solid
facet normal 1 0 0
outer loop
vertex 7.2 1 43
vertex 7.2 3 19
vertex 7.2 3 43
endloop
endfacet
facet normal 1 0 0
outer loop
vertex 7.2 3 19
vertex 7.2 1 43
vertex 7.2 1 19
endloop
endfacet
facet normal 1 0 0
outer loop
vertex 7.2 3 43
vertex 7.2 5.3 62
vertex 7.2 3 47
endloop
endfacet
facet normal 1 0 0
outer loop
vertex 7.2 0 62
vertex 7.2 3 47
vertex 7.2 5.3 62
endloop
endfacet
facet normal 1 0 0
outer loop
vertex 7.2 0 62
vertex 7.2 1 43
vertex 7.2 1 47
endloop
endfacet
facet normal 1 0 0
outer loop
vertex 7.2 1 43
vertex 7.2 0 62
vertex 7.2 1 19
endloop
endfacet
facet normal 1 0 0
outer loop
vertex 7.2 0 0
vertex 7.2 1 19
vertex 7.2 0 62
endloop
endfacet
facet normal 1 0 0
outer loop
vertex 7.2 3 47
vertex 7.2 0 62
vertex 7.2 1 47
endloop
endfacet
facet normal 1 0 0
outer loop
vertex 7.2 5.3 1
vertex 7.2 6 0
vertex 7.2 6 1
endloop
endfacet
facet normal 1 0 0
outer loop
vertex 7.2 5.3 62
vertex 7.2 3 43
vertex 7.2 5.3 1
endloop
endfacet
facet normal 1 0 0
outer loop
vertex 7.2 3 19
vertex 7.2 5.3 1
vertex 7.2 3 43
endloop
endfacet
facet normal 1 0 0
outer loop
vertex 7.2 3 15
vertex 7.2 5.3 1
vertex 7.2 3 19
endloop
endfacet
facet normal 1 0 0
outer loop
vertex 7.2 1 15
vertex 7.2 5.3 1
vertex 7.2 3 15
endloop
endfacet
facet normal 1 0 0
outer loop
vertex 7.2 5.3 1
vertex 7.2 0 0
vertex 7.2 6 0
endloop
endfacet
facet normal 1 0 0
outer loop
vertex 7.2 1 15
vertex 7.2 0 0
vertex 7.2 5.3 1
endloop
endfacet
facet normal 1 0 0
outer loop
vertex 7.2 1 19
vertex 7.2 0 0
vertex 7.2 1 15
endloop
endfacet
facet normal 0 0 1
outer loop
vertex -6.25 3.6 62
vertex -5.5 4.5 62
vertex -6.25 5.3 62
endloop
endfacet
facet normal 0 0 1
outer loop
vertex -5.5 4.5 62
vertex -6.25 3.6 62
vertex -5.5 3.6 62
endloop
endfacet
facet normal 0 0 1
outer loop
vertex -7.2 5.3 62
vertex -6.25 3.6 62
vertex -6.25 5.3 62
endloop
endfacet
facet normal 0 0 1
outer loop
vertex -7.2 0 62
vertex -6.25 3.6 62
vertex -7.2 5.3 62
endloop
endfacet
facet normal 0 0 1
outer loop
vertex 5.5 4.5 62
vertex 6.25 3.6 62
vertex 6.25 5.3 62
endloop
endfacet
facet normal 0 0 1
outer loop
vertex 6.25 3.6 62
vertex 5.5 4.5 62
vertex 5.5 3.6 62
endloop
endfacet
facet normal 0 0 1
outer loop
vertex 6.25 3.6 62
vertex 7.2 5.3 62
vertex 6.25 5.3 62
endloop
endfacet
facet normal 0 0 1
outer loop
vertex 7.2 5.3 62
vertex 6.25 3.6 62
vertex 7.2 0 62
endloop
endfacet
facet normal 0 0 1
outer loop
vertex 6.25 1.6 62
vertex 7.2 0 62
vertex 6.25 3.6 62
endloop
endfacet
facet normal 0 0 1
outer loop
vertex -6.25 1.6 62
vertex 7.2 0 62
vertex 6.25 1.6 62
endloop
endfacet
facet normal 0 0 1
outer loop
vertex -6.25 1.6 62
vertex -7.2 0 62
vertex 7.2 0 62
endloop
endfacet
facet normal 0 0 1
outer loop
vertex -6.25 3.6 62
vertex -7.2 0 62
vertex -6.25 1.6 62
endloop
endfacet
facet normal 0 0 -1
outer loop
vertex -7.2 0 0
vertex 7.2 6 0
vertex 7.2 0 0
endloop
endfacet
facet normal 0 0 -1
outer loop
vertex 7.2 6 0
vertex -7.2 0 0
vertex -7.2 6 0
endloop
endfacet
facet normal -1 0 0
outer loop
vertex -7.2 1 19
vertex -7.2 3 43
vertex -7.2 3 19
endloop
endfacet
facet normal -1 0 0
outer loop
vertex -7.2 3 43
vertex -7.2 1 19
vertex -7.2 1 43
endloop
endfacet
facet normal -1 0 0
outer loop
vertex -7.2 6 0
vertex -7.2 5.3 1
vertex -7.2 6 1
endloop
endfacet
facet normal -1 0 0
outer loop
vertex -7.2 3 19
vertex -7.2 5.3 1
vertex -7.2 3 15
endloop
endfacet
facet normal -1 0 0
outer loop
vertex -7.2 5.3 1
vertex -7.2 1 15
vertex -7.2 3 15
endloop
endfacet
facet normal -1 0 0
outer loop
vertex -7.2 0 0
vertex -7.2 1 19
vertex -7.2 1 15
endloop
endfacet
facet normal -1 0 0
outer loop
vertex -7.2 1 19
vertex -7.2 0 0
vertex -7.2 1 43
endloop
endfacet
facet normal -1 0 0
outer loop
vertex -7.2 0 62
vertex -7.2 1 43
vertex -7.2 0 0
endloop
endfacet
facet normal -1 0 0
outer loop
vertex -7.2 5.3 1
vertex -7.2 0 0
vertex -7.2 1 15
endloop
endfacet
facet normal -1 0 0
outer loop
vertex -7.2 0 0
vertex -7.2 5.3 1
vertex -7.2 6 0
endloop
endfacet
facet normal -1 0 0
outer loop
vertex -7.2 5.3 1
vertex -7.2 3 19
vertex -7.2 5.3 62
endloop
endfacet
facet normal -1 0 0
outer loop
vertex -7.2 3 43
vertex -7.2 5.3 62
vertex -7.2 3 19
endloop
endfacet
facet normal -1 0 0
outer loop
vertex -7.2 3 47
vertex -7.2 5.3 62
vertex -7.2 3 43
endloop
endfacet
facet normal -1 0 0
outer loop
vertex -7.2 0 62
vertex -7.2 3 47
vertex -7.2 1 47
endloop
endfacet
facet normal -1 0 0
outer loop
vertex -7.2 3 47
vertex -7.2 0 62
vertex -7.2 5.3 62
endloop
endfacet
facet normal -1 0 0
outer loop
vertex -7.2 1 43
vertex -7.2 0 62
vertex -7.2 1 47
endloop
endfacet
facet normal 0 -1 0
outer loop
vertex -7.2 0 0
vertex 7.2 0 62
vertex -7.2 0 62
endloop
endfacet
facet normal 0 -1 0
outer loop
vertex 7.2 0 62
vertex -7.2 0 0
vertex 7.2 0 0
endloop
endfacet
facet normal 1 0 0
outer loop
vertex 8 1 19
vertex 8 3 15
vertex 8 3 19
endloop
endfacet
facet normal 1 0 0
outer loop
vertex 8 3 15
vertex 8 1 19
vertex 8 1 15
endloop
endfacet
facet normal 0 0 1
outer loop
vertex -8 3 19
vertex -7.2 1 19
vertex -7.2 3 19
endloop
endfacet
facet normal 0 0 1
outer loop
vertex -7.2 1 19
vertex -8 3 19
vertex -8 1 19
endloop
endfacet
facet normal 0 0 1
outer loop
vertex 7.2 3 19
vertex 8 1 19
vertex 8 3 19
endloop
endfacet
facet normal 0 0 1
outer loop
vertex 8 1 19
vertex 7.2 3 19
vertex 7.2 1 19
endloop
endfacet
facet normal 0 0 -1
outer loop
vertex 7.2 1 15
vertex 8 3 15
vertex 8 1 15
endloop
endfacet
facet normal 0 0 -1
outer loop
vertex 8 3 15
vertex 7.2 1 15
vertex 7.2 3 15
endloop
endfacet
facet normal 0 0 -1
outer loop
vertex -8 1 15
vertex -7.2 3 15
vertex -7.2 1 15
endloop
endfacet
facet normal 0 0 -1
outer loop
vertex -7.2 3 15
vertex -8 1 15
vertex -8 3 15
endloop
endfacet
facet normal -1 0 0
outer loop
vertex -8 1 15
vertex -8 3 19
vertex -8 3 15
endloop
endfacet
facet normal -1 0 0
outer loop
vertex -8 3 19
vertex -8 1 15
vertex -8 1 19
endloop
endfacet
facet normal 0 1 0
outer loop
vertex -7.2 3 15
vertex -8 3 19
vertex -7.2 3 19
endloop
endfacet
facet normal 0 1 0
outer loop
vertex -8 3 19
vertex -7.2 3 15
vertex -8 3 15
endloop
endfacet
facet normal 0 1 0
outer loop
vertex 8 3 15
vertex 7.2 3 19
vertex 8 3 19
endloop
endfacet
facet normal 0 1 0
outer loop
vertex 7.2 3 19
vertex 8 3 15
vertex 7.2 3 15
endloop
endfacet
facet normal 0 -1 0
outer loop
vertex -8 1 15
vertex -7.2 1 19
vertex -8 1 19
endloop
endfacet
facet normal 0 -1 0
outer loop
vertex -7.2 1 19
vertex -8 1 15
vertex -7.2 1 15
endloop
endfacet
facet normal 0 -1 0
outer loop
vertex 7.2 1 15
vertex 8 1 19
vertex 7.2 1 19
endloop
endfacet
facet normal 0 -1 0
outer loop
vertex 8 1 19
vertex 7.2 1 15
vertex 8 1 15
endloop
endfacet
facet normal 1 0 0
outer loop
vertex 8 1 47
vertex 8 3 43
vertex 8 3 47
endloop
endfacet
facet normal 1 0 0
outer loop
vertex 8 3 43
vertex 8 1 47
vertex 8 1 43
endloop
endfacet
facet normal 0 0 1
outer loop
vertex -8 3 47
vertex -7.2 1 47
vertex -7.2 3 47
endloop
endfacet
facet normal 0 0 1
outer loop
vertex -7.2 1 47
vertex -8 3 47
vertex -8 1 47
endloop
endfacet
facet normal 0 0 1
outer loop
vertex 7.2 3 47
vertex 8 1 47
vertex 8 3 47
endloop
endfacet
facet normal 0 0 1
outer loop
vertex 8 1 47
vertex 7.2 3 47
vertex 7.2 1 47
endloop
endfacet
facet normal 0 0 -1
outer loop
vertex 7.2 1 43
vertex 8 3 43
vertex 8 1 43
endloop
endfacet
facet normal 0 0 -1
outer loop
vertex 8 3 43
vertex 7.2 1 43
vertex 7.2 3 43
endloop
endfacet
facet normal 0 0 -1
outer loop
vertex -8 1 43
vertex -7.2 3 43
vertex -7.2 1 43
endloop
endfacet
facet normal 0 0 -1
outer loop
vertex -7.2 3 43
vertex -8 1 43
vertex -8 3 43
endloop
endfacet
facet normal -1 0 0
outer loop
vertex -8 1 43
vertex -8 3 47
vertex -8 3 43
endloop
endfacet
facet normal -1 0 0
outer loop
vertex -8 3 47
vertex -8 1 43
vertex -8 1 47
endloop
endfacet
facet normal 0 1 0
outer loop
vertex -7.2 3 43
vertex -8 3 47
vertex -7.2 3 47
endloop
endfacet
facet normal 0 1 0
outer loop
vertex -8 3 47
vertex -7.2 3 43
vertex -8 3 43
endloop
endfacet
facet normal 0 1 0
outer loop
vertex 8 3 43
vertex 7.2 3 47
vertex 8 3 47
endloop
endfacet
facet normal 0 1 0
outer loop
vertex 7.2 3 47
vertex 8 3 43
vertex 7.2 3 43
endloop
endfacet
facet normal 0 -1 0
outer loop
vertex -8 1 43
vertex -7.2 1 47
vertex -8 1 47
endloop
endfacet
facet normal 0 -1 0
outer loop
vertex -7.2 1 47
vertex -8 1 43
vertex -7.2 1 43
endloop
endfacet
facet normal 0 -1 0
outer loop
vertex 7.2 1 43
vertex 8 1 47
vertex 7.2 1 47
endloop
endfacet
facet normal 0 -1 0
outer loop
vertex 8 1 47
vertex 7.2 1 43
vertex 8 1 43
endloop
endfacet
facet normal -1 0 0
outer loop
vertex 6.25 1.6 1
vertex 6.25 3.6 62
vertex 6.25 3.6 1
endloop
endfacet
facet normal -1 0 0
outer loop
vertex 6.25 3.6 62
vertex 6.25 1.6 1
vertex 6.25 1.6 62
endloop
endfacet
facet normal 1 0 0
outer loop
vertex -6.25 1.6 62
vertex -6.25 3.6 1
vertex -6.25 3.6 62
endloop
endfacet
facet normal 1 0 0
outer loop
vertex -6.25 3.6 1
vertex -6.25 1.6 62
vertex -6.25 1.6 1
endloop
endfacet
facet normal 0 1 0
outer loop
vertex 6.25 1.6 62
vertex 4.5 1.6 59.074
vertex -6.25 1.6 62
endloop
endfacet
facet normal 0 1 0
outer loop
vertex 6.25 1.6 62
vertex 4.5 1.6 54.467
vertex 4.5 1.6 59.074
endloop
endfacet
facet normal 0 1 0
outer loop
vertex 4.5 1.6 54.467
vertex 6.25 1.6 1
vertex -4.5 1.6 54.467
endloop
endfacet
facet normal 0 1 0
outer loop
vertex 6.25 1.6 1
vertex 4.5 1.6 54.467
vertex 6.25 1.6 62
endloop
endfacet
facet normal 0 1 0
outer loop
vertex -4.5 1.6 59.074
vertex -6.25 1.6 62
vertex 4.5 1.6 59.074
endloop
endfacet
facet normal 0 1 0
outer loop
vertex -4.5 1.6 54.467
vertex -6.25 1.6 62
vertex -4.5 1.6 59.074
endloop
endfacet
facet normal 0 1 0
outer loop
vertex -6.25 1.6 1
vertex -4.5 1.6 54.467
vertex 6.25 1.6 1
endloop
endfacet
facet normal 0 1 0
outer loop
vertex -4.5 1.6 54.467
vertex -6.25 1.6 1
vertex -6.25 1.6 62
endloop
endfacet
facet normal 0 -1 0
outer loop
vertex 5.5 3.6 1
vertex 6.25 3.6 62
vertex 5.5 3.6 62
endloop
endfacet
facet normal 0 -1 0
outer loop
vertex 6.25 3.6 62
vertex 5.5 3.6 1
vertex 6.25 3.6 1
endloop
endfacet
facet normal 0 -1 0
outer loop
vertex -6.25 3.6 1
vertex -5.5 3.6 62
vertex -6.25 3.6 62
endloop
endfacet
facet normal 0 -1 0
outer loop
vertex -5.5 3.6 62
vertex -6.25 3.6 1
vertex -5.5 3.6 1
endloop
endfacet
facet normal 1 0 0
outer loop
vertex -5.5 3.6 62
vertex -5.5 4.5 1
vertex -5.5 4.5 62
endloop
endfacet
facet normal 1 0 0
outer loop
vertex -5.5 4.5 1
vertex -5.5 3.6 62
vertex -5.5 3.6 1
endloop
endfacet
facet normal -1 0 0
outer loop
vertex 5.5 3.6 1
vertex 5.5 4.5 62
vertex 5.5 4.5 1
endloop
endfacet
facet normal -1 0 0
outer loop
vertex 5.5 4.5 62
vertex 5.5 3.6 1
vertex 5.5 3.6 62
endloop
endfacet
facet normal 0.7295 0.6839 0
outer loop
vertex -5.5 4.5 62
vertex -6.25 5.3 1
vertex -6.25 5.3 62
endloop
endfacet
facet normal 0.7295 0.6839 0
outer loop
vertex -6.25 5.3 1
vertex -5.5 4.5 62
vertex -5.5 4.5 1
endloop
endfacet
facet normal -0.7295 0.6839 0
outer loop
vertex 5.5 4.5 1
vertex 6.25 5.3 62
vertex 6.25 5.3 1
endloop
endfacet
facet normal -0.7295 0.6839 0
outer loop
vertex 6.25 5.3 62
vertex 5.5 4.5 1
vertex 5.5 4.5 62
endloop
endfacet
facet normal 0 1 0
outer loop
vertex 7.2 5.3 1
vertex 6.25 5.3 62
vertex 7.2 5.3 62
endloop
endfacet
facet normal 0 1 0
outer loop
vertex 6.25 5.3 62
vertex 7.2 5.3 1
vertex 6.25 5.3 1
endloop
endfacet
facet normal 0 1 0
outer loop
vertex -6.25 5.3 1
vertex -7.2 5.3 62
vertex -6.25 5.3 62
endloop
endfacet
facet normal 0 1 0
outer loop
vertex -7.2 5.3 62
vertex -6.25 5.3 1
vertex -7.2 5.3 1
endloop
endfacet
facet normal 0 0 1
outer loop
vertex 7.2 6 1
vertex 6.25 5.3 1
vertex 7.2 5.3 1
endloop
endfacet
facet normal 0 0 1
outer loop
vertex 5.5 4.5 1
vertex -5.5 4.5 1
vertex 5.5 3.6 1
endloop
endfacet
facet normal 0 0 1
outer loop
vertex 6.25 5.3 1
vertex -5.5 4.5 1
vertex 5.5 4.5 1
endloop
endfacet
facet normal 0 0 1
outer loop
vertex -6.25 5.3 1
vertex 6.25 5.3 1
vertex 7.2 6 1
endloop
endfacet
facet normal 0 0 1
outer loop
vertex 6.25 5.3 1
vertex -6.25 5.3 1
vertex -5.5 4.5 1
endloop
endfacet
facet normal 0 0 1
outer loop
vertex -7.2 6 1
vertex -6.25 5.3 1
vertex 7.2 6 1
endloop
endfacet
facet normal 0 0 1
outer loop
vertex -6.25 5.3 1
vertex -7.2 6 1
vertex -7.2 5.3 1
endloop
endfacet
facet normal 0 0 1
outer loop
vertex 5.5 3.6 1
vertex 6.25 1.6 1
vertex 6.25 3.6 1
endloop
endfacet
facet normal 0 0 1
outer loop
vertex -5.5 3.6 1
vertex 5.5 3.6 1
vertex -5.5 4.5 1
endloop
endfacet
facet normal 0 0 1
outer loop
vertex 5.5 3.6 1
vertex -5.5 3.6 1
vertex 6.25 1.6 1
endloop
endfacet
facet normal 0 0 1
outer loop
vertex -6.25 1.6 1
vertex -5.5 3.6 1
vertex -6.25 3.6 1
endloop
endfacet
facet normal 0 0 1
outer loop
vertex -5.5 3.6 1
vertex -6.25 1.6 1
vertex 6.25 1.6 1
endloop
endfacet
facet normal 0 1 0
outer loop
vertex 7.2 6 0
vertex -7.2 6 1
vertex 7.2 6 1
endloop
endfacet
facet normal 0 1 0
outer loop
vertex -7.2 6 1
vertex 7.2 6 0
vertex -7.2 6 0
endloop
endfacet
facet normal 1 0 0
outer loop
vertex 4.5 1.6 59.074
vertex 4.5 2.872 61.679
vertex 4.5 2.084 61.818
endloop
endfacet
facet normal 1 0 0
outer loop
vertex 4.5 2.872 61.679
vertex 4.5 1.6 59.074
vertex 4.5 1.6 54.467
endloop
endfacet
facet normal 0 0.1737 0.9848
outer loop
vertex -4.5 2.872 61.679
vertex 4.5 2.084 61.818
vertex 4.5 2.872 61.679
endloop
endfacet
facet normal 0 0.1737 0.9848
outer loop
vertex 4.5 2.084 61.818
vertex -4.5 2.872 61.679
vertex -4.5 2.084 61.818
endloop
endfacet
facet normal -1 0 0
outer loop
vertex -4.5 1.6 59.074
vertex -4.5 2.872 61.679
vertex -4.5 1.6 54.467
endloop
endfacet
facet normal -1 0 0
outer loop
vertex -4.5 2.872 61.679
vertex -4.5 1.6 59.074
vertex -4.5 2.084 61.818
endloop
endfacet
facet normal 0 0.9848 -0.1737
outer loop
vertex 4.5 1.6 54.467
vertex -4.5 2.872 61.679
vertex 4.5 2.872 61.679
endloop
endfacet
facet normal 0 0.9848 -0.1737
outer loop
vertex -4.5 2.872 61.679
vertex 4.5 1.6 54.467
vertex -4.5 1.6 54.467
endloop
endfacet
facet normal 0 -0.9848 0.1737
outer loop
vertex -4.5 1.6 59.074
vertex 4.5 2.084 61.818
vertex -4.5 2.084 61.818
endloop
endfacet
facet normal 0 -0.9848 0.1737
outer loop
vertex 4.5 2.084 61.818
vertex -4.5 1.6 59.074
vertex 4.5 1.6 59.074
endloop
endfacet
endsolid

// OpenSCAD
//


p_d1 = 12.5; // hyllsans stora diameter 12mm
p_d2 = 11; // diametern inne i klacken 10.4mm

h0 = 0.4*4;
h1 = 2; // höjd första delen bakifrån på hyllsan
h2 = 0.9;
h3 = 0.8;

b = 6;
w = 14.4;
m_h = 62; // total höjd/längd på magasinet 62
stop_h = 15;
stop_w = 16;

spring_w = 9;
spring_y = 0.4*2;

$fs=0.1;
magasin();
module magasin() {
    difference() {
        union() {
            translate([-w/2, 0, 0]) cube([w, b, m_h]);
            translate([-stop_w/2, 1, stop_h]) cube([stop_w, 2, 4]);
            translate([-stop_w/2, 1, m_h-stop_h-4]) cube([stop_w, 2, 4]);
        }
        
        hull() {
            translate([0, h0, 0]) rotate([-90,0,0]) cylinder(d=p_d1, h=h1);
            translate([0, h0, m_h]) rotate([-90,0,0]) cylinder(d=p_d1, h=h1);
        }
        hull() {
            translate([0, h0+h1, 0]) rotate([-90,0,0]) cylinder(d=p_d2, h=h2);
            translate([0, h0+h1, m_h]) rotate([-90,0,0]) cylinder(d=p_d2, h=h2);
        }
        hull() {
            translate([0, h0+h1+h2, 0]) rotate([-90,0,0]) cylinder(d1=p_d2, d2=p_d1, h=h3);
            translate([0, h0+h1+h2, m_h]) rotate([-90,0,0]) cylinder(d1=p_d2, d2=p_d1, h=h3);
        }
        
        hull() {
            translate([0, h0+h1+h2+h3, 0]) rotate([-90,0,0]) cylinder(d=p_d1+2, h=50);
            translate([0, h0+h1+h2+h3, m_h]) rotate([-90,0,0]) cylinder(d=p_d1+2, h=50);
        }
        //translate([-spring_w/2-1, 0, m_h-11]) cube([spring_w+2, spring_y+10, 12+1]);
    }
    translate([-w/2, 0, 0]) cube([w, b, 1]);
    //m
    translate([-spring_w/2, 0, m_h-12]) rotate([-10,0,0]) cube([spring_w, spring_y, 12]);
}
    
    
